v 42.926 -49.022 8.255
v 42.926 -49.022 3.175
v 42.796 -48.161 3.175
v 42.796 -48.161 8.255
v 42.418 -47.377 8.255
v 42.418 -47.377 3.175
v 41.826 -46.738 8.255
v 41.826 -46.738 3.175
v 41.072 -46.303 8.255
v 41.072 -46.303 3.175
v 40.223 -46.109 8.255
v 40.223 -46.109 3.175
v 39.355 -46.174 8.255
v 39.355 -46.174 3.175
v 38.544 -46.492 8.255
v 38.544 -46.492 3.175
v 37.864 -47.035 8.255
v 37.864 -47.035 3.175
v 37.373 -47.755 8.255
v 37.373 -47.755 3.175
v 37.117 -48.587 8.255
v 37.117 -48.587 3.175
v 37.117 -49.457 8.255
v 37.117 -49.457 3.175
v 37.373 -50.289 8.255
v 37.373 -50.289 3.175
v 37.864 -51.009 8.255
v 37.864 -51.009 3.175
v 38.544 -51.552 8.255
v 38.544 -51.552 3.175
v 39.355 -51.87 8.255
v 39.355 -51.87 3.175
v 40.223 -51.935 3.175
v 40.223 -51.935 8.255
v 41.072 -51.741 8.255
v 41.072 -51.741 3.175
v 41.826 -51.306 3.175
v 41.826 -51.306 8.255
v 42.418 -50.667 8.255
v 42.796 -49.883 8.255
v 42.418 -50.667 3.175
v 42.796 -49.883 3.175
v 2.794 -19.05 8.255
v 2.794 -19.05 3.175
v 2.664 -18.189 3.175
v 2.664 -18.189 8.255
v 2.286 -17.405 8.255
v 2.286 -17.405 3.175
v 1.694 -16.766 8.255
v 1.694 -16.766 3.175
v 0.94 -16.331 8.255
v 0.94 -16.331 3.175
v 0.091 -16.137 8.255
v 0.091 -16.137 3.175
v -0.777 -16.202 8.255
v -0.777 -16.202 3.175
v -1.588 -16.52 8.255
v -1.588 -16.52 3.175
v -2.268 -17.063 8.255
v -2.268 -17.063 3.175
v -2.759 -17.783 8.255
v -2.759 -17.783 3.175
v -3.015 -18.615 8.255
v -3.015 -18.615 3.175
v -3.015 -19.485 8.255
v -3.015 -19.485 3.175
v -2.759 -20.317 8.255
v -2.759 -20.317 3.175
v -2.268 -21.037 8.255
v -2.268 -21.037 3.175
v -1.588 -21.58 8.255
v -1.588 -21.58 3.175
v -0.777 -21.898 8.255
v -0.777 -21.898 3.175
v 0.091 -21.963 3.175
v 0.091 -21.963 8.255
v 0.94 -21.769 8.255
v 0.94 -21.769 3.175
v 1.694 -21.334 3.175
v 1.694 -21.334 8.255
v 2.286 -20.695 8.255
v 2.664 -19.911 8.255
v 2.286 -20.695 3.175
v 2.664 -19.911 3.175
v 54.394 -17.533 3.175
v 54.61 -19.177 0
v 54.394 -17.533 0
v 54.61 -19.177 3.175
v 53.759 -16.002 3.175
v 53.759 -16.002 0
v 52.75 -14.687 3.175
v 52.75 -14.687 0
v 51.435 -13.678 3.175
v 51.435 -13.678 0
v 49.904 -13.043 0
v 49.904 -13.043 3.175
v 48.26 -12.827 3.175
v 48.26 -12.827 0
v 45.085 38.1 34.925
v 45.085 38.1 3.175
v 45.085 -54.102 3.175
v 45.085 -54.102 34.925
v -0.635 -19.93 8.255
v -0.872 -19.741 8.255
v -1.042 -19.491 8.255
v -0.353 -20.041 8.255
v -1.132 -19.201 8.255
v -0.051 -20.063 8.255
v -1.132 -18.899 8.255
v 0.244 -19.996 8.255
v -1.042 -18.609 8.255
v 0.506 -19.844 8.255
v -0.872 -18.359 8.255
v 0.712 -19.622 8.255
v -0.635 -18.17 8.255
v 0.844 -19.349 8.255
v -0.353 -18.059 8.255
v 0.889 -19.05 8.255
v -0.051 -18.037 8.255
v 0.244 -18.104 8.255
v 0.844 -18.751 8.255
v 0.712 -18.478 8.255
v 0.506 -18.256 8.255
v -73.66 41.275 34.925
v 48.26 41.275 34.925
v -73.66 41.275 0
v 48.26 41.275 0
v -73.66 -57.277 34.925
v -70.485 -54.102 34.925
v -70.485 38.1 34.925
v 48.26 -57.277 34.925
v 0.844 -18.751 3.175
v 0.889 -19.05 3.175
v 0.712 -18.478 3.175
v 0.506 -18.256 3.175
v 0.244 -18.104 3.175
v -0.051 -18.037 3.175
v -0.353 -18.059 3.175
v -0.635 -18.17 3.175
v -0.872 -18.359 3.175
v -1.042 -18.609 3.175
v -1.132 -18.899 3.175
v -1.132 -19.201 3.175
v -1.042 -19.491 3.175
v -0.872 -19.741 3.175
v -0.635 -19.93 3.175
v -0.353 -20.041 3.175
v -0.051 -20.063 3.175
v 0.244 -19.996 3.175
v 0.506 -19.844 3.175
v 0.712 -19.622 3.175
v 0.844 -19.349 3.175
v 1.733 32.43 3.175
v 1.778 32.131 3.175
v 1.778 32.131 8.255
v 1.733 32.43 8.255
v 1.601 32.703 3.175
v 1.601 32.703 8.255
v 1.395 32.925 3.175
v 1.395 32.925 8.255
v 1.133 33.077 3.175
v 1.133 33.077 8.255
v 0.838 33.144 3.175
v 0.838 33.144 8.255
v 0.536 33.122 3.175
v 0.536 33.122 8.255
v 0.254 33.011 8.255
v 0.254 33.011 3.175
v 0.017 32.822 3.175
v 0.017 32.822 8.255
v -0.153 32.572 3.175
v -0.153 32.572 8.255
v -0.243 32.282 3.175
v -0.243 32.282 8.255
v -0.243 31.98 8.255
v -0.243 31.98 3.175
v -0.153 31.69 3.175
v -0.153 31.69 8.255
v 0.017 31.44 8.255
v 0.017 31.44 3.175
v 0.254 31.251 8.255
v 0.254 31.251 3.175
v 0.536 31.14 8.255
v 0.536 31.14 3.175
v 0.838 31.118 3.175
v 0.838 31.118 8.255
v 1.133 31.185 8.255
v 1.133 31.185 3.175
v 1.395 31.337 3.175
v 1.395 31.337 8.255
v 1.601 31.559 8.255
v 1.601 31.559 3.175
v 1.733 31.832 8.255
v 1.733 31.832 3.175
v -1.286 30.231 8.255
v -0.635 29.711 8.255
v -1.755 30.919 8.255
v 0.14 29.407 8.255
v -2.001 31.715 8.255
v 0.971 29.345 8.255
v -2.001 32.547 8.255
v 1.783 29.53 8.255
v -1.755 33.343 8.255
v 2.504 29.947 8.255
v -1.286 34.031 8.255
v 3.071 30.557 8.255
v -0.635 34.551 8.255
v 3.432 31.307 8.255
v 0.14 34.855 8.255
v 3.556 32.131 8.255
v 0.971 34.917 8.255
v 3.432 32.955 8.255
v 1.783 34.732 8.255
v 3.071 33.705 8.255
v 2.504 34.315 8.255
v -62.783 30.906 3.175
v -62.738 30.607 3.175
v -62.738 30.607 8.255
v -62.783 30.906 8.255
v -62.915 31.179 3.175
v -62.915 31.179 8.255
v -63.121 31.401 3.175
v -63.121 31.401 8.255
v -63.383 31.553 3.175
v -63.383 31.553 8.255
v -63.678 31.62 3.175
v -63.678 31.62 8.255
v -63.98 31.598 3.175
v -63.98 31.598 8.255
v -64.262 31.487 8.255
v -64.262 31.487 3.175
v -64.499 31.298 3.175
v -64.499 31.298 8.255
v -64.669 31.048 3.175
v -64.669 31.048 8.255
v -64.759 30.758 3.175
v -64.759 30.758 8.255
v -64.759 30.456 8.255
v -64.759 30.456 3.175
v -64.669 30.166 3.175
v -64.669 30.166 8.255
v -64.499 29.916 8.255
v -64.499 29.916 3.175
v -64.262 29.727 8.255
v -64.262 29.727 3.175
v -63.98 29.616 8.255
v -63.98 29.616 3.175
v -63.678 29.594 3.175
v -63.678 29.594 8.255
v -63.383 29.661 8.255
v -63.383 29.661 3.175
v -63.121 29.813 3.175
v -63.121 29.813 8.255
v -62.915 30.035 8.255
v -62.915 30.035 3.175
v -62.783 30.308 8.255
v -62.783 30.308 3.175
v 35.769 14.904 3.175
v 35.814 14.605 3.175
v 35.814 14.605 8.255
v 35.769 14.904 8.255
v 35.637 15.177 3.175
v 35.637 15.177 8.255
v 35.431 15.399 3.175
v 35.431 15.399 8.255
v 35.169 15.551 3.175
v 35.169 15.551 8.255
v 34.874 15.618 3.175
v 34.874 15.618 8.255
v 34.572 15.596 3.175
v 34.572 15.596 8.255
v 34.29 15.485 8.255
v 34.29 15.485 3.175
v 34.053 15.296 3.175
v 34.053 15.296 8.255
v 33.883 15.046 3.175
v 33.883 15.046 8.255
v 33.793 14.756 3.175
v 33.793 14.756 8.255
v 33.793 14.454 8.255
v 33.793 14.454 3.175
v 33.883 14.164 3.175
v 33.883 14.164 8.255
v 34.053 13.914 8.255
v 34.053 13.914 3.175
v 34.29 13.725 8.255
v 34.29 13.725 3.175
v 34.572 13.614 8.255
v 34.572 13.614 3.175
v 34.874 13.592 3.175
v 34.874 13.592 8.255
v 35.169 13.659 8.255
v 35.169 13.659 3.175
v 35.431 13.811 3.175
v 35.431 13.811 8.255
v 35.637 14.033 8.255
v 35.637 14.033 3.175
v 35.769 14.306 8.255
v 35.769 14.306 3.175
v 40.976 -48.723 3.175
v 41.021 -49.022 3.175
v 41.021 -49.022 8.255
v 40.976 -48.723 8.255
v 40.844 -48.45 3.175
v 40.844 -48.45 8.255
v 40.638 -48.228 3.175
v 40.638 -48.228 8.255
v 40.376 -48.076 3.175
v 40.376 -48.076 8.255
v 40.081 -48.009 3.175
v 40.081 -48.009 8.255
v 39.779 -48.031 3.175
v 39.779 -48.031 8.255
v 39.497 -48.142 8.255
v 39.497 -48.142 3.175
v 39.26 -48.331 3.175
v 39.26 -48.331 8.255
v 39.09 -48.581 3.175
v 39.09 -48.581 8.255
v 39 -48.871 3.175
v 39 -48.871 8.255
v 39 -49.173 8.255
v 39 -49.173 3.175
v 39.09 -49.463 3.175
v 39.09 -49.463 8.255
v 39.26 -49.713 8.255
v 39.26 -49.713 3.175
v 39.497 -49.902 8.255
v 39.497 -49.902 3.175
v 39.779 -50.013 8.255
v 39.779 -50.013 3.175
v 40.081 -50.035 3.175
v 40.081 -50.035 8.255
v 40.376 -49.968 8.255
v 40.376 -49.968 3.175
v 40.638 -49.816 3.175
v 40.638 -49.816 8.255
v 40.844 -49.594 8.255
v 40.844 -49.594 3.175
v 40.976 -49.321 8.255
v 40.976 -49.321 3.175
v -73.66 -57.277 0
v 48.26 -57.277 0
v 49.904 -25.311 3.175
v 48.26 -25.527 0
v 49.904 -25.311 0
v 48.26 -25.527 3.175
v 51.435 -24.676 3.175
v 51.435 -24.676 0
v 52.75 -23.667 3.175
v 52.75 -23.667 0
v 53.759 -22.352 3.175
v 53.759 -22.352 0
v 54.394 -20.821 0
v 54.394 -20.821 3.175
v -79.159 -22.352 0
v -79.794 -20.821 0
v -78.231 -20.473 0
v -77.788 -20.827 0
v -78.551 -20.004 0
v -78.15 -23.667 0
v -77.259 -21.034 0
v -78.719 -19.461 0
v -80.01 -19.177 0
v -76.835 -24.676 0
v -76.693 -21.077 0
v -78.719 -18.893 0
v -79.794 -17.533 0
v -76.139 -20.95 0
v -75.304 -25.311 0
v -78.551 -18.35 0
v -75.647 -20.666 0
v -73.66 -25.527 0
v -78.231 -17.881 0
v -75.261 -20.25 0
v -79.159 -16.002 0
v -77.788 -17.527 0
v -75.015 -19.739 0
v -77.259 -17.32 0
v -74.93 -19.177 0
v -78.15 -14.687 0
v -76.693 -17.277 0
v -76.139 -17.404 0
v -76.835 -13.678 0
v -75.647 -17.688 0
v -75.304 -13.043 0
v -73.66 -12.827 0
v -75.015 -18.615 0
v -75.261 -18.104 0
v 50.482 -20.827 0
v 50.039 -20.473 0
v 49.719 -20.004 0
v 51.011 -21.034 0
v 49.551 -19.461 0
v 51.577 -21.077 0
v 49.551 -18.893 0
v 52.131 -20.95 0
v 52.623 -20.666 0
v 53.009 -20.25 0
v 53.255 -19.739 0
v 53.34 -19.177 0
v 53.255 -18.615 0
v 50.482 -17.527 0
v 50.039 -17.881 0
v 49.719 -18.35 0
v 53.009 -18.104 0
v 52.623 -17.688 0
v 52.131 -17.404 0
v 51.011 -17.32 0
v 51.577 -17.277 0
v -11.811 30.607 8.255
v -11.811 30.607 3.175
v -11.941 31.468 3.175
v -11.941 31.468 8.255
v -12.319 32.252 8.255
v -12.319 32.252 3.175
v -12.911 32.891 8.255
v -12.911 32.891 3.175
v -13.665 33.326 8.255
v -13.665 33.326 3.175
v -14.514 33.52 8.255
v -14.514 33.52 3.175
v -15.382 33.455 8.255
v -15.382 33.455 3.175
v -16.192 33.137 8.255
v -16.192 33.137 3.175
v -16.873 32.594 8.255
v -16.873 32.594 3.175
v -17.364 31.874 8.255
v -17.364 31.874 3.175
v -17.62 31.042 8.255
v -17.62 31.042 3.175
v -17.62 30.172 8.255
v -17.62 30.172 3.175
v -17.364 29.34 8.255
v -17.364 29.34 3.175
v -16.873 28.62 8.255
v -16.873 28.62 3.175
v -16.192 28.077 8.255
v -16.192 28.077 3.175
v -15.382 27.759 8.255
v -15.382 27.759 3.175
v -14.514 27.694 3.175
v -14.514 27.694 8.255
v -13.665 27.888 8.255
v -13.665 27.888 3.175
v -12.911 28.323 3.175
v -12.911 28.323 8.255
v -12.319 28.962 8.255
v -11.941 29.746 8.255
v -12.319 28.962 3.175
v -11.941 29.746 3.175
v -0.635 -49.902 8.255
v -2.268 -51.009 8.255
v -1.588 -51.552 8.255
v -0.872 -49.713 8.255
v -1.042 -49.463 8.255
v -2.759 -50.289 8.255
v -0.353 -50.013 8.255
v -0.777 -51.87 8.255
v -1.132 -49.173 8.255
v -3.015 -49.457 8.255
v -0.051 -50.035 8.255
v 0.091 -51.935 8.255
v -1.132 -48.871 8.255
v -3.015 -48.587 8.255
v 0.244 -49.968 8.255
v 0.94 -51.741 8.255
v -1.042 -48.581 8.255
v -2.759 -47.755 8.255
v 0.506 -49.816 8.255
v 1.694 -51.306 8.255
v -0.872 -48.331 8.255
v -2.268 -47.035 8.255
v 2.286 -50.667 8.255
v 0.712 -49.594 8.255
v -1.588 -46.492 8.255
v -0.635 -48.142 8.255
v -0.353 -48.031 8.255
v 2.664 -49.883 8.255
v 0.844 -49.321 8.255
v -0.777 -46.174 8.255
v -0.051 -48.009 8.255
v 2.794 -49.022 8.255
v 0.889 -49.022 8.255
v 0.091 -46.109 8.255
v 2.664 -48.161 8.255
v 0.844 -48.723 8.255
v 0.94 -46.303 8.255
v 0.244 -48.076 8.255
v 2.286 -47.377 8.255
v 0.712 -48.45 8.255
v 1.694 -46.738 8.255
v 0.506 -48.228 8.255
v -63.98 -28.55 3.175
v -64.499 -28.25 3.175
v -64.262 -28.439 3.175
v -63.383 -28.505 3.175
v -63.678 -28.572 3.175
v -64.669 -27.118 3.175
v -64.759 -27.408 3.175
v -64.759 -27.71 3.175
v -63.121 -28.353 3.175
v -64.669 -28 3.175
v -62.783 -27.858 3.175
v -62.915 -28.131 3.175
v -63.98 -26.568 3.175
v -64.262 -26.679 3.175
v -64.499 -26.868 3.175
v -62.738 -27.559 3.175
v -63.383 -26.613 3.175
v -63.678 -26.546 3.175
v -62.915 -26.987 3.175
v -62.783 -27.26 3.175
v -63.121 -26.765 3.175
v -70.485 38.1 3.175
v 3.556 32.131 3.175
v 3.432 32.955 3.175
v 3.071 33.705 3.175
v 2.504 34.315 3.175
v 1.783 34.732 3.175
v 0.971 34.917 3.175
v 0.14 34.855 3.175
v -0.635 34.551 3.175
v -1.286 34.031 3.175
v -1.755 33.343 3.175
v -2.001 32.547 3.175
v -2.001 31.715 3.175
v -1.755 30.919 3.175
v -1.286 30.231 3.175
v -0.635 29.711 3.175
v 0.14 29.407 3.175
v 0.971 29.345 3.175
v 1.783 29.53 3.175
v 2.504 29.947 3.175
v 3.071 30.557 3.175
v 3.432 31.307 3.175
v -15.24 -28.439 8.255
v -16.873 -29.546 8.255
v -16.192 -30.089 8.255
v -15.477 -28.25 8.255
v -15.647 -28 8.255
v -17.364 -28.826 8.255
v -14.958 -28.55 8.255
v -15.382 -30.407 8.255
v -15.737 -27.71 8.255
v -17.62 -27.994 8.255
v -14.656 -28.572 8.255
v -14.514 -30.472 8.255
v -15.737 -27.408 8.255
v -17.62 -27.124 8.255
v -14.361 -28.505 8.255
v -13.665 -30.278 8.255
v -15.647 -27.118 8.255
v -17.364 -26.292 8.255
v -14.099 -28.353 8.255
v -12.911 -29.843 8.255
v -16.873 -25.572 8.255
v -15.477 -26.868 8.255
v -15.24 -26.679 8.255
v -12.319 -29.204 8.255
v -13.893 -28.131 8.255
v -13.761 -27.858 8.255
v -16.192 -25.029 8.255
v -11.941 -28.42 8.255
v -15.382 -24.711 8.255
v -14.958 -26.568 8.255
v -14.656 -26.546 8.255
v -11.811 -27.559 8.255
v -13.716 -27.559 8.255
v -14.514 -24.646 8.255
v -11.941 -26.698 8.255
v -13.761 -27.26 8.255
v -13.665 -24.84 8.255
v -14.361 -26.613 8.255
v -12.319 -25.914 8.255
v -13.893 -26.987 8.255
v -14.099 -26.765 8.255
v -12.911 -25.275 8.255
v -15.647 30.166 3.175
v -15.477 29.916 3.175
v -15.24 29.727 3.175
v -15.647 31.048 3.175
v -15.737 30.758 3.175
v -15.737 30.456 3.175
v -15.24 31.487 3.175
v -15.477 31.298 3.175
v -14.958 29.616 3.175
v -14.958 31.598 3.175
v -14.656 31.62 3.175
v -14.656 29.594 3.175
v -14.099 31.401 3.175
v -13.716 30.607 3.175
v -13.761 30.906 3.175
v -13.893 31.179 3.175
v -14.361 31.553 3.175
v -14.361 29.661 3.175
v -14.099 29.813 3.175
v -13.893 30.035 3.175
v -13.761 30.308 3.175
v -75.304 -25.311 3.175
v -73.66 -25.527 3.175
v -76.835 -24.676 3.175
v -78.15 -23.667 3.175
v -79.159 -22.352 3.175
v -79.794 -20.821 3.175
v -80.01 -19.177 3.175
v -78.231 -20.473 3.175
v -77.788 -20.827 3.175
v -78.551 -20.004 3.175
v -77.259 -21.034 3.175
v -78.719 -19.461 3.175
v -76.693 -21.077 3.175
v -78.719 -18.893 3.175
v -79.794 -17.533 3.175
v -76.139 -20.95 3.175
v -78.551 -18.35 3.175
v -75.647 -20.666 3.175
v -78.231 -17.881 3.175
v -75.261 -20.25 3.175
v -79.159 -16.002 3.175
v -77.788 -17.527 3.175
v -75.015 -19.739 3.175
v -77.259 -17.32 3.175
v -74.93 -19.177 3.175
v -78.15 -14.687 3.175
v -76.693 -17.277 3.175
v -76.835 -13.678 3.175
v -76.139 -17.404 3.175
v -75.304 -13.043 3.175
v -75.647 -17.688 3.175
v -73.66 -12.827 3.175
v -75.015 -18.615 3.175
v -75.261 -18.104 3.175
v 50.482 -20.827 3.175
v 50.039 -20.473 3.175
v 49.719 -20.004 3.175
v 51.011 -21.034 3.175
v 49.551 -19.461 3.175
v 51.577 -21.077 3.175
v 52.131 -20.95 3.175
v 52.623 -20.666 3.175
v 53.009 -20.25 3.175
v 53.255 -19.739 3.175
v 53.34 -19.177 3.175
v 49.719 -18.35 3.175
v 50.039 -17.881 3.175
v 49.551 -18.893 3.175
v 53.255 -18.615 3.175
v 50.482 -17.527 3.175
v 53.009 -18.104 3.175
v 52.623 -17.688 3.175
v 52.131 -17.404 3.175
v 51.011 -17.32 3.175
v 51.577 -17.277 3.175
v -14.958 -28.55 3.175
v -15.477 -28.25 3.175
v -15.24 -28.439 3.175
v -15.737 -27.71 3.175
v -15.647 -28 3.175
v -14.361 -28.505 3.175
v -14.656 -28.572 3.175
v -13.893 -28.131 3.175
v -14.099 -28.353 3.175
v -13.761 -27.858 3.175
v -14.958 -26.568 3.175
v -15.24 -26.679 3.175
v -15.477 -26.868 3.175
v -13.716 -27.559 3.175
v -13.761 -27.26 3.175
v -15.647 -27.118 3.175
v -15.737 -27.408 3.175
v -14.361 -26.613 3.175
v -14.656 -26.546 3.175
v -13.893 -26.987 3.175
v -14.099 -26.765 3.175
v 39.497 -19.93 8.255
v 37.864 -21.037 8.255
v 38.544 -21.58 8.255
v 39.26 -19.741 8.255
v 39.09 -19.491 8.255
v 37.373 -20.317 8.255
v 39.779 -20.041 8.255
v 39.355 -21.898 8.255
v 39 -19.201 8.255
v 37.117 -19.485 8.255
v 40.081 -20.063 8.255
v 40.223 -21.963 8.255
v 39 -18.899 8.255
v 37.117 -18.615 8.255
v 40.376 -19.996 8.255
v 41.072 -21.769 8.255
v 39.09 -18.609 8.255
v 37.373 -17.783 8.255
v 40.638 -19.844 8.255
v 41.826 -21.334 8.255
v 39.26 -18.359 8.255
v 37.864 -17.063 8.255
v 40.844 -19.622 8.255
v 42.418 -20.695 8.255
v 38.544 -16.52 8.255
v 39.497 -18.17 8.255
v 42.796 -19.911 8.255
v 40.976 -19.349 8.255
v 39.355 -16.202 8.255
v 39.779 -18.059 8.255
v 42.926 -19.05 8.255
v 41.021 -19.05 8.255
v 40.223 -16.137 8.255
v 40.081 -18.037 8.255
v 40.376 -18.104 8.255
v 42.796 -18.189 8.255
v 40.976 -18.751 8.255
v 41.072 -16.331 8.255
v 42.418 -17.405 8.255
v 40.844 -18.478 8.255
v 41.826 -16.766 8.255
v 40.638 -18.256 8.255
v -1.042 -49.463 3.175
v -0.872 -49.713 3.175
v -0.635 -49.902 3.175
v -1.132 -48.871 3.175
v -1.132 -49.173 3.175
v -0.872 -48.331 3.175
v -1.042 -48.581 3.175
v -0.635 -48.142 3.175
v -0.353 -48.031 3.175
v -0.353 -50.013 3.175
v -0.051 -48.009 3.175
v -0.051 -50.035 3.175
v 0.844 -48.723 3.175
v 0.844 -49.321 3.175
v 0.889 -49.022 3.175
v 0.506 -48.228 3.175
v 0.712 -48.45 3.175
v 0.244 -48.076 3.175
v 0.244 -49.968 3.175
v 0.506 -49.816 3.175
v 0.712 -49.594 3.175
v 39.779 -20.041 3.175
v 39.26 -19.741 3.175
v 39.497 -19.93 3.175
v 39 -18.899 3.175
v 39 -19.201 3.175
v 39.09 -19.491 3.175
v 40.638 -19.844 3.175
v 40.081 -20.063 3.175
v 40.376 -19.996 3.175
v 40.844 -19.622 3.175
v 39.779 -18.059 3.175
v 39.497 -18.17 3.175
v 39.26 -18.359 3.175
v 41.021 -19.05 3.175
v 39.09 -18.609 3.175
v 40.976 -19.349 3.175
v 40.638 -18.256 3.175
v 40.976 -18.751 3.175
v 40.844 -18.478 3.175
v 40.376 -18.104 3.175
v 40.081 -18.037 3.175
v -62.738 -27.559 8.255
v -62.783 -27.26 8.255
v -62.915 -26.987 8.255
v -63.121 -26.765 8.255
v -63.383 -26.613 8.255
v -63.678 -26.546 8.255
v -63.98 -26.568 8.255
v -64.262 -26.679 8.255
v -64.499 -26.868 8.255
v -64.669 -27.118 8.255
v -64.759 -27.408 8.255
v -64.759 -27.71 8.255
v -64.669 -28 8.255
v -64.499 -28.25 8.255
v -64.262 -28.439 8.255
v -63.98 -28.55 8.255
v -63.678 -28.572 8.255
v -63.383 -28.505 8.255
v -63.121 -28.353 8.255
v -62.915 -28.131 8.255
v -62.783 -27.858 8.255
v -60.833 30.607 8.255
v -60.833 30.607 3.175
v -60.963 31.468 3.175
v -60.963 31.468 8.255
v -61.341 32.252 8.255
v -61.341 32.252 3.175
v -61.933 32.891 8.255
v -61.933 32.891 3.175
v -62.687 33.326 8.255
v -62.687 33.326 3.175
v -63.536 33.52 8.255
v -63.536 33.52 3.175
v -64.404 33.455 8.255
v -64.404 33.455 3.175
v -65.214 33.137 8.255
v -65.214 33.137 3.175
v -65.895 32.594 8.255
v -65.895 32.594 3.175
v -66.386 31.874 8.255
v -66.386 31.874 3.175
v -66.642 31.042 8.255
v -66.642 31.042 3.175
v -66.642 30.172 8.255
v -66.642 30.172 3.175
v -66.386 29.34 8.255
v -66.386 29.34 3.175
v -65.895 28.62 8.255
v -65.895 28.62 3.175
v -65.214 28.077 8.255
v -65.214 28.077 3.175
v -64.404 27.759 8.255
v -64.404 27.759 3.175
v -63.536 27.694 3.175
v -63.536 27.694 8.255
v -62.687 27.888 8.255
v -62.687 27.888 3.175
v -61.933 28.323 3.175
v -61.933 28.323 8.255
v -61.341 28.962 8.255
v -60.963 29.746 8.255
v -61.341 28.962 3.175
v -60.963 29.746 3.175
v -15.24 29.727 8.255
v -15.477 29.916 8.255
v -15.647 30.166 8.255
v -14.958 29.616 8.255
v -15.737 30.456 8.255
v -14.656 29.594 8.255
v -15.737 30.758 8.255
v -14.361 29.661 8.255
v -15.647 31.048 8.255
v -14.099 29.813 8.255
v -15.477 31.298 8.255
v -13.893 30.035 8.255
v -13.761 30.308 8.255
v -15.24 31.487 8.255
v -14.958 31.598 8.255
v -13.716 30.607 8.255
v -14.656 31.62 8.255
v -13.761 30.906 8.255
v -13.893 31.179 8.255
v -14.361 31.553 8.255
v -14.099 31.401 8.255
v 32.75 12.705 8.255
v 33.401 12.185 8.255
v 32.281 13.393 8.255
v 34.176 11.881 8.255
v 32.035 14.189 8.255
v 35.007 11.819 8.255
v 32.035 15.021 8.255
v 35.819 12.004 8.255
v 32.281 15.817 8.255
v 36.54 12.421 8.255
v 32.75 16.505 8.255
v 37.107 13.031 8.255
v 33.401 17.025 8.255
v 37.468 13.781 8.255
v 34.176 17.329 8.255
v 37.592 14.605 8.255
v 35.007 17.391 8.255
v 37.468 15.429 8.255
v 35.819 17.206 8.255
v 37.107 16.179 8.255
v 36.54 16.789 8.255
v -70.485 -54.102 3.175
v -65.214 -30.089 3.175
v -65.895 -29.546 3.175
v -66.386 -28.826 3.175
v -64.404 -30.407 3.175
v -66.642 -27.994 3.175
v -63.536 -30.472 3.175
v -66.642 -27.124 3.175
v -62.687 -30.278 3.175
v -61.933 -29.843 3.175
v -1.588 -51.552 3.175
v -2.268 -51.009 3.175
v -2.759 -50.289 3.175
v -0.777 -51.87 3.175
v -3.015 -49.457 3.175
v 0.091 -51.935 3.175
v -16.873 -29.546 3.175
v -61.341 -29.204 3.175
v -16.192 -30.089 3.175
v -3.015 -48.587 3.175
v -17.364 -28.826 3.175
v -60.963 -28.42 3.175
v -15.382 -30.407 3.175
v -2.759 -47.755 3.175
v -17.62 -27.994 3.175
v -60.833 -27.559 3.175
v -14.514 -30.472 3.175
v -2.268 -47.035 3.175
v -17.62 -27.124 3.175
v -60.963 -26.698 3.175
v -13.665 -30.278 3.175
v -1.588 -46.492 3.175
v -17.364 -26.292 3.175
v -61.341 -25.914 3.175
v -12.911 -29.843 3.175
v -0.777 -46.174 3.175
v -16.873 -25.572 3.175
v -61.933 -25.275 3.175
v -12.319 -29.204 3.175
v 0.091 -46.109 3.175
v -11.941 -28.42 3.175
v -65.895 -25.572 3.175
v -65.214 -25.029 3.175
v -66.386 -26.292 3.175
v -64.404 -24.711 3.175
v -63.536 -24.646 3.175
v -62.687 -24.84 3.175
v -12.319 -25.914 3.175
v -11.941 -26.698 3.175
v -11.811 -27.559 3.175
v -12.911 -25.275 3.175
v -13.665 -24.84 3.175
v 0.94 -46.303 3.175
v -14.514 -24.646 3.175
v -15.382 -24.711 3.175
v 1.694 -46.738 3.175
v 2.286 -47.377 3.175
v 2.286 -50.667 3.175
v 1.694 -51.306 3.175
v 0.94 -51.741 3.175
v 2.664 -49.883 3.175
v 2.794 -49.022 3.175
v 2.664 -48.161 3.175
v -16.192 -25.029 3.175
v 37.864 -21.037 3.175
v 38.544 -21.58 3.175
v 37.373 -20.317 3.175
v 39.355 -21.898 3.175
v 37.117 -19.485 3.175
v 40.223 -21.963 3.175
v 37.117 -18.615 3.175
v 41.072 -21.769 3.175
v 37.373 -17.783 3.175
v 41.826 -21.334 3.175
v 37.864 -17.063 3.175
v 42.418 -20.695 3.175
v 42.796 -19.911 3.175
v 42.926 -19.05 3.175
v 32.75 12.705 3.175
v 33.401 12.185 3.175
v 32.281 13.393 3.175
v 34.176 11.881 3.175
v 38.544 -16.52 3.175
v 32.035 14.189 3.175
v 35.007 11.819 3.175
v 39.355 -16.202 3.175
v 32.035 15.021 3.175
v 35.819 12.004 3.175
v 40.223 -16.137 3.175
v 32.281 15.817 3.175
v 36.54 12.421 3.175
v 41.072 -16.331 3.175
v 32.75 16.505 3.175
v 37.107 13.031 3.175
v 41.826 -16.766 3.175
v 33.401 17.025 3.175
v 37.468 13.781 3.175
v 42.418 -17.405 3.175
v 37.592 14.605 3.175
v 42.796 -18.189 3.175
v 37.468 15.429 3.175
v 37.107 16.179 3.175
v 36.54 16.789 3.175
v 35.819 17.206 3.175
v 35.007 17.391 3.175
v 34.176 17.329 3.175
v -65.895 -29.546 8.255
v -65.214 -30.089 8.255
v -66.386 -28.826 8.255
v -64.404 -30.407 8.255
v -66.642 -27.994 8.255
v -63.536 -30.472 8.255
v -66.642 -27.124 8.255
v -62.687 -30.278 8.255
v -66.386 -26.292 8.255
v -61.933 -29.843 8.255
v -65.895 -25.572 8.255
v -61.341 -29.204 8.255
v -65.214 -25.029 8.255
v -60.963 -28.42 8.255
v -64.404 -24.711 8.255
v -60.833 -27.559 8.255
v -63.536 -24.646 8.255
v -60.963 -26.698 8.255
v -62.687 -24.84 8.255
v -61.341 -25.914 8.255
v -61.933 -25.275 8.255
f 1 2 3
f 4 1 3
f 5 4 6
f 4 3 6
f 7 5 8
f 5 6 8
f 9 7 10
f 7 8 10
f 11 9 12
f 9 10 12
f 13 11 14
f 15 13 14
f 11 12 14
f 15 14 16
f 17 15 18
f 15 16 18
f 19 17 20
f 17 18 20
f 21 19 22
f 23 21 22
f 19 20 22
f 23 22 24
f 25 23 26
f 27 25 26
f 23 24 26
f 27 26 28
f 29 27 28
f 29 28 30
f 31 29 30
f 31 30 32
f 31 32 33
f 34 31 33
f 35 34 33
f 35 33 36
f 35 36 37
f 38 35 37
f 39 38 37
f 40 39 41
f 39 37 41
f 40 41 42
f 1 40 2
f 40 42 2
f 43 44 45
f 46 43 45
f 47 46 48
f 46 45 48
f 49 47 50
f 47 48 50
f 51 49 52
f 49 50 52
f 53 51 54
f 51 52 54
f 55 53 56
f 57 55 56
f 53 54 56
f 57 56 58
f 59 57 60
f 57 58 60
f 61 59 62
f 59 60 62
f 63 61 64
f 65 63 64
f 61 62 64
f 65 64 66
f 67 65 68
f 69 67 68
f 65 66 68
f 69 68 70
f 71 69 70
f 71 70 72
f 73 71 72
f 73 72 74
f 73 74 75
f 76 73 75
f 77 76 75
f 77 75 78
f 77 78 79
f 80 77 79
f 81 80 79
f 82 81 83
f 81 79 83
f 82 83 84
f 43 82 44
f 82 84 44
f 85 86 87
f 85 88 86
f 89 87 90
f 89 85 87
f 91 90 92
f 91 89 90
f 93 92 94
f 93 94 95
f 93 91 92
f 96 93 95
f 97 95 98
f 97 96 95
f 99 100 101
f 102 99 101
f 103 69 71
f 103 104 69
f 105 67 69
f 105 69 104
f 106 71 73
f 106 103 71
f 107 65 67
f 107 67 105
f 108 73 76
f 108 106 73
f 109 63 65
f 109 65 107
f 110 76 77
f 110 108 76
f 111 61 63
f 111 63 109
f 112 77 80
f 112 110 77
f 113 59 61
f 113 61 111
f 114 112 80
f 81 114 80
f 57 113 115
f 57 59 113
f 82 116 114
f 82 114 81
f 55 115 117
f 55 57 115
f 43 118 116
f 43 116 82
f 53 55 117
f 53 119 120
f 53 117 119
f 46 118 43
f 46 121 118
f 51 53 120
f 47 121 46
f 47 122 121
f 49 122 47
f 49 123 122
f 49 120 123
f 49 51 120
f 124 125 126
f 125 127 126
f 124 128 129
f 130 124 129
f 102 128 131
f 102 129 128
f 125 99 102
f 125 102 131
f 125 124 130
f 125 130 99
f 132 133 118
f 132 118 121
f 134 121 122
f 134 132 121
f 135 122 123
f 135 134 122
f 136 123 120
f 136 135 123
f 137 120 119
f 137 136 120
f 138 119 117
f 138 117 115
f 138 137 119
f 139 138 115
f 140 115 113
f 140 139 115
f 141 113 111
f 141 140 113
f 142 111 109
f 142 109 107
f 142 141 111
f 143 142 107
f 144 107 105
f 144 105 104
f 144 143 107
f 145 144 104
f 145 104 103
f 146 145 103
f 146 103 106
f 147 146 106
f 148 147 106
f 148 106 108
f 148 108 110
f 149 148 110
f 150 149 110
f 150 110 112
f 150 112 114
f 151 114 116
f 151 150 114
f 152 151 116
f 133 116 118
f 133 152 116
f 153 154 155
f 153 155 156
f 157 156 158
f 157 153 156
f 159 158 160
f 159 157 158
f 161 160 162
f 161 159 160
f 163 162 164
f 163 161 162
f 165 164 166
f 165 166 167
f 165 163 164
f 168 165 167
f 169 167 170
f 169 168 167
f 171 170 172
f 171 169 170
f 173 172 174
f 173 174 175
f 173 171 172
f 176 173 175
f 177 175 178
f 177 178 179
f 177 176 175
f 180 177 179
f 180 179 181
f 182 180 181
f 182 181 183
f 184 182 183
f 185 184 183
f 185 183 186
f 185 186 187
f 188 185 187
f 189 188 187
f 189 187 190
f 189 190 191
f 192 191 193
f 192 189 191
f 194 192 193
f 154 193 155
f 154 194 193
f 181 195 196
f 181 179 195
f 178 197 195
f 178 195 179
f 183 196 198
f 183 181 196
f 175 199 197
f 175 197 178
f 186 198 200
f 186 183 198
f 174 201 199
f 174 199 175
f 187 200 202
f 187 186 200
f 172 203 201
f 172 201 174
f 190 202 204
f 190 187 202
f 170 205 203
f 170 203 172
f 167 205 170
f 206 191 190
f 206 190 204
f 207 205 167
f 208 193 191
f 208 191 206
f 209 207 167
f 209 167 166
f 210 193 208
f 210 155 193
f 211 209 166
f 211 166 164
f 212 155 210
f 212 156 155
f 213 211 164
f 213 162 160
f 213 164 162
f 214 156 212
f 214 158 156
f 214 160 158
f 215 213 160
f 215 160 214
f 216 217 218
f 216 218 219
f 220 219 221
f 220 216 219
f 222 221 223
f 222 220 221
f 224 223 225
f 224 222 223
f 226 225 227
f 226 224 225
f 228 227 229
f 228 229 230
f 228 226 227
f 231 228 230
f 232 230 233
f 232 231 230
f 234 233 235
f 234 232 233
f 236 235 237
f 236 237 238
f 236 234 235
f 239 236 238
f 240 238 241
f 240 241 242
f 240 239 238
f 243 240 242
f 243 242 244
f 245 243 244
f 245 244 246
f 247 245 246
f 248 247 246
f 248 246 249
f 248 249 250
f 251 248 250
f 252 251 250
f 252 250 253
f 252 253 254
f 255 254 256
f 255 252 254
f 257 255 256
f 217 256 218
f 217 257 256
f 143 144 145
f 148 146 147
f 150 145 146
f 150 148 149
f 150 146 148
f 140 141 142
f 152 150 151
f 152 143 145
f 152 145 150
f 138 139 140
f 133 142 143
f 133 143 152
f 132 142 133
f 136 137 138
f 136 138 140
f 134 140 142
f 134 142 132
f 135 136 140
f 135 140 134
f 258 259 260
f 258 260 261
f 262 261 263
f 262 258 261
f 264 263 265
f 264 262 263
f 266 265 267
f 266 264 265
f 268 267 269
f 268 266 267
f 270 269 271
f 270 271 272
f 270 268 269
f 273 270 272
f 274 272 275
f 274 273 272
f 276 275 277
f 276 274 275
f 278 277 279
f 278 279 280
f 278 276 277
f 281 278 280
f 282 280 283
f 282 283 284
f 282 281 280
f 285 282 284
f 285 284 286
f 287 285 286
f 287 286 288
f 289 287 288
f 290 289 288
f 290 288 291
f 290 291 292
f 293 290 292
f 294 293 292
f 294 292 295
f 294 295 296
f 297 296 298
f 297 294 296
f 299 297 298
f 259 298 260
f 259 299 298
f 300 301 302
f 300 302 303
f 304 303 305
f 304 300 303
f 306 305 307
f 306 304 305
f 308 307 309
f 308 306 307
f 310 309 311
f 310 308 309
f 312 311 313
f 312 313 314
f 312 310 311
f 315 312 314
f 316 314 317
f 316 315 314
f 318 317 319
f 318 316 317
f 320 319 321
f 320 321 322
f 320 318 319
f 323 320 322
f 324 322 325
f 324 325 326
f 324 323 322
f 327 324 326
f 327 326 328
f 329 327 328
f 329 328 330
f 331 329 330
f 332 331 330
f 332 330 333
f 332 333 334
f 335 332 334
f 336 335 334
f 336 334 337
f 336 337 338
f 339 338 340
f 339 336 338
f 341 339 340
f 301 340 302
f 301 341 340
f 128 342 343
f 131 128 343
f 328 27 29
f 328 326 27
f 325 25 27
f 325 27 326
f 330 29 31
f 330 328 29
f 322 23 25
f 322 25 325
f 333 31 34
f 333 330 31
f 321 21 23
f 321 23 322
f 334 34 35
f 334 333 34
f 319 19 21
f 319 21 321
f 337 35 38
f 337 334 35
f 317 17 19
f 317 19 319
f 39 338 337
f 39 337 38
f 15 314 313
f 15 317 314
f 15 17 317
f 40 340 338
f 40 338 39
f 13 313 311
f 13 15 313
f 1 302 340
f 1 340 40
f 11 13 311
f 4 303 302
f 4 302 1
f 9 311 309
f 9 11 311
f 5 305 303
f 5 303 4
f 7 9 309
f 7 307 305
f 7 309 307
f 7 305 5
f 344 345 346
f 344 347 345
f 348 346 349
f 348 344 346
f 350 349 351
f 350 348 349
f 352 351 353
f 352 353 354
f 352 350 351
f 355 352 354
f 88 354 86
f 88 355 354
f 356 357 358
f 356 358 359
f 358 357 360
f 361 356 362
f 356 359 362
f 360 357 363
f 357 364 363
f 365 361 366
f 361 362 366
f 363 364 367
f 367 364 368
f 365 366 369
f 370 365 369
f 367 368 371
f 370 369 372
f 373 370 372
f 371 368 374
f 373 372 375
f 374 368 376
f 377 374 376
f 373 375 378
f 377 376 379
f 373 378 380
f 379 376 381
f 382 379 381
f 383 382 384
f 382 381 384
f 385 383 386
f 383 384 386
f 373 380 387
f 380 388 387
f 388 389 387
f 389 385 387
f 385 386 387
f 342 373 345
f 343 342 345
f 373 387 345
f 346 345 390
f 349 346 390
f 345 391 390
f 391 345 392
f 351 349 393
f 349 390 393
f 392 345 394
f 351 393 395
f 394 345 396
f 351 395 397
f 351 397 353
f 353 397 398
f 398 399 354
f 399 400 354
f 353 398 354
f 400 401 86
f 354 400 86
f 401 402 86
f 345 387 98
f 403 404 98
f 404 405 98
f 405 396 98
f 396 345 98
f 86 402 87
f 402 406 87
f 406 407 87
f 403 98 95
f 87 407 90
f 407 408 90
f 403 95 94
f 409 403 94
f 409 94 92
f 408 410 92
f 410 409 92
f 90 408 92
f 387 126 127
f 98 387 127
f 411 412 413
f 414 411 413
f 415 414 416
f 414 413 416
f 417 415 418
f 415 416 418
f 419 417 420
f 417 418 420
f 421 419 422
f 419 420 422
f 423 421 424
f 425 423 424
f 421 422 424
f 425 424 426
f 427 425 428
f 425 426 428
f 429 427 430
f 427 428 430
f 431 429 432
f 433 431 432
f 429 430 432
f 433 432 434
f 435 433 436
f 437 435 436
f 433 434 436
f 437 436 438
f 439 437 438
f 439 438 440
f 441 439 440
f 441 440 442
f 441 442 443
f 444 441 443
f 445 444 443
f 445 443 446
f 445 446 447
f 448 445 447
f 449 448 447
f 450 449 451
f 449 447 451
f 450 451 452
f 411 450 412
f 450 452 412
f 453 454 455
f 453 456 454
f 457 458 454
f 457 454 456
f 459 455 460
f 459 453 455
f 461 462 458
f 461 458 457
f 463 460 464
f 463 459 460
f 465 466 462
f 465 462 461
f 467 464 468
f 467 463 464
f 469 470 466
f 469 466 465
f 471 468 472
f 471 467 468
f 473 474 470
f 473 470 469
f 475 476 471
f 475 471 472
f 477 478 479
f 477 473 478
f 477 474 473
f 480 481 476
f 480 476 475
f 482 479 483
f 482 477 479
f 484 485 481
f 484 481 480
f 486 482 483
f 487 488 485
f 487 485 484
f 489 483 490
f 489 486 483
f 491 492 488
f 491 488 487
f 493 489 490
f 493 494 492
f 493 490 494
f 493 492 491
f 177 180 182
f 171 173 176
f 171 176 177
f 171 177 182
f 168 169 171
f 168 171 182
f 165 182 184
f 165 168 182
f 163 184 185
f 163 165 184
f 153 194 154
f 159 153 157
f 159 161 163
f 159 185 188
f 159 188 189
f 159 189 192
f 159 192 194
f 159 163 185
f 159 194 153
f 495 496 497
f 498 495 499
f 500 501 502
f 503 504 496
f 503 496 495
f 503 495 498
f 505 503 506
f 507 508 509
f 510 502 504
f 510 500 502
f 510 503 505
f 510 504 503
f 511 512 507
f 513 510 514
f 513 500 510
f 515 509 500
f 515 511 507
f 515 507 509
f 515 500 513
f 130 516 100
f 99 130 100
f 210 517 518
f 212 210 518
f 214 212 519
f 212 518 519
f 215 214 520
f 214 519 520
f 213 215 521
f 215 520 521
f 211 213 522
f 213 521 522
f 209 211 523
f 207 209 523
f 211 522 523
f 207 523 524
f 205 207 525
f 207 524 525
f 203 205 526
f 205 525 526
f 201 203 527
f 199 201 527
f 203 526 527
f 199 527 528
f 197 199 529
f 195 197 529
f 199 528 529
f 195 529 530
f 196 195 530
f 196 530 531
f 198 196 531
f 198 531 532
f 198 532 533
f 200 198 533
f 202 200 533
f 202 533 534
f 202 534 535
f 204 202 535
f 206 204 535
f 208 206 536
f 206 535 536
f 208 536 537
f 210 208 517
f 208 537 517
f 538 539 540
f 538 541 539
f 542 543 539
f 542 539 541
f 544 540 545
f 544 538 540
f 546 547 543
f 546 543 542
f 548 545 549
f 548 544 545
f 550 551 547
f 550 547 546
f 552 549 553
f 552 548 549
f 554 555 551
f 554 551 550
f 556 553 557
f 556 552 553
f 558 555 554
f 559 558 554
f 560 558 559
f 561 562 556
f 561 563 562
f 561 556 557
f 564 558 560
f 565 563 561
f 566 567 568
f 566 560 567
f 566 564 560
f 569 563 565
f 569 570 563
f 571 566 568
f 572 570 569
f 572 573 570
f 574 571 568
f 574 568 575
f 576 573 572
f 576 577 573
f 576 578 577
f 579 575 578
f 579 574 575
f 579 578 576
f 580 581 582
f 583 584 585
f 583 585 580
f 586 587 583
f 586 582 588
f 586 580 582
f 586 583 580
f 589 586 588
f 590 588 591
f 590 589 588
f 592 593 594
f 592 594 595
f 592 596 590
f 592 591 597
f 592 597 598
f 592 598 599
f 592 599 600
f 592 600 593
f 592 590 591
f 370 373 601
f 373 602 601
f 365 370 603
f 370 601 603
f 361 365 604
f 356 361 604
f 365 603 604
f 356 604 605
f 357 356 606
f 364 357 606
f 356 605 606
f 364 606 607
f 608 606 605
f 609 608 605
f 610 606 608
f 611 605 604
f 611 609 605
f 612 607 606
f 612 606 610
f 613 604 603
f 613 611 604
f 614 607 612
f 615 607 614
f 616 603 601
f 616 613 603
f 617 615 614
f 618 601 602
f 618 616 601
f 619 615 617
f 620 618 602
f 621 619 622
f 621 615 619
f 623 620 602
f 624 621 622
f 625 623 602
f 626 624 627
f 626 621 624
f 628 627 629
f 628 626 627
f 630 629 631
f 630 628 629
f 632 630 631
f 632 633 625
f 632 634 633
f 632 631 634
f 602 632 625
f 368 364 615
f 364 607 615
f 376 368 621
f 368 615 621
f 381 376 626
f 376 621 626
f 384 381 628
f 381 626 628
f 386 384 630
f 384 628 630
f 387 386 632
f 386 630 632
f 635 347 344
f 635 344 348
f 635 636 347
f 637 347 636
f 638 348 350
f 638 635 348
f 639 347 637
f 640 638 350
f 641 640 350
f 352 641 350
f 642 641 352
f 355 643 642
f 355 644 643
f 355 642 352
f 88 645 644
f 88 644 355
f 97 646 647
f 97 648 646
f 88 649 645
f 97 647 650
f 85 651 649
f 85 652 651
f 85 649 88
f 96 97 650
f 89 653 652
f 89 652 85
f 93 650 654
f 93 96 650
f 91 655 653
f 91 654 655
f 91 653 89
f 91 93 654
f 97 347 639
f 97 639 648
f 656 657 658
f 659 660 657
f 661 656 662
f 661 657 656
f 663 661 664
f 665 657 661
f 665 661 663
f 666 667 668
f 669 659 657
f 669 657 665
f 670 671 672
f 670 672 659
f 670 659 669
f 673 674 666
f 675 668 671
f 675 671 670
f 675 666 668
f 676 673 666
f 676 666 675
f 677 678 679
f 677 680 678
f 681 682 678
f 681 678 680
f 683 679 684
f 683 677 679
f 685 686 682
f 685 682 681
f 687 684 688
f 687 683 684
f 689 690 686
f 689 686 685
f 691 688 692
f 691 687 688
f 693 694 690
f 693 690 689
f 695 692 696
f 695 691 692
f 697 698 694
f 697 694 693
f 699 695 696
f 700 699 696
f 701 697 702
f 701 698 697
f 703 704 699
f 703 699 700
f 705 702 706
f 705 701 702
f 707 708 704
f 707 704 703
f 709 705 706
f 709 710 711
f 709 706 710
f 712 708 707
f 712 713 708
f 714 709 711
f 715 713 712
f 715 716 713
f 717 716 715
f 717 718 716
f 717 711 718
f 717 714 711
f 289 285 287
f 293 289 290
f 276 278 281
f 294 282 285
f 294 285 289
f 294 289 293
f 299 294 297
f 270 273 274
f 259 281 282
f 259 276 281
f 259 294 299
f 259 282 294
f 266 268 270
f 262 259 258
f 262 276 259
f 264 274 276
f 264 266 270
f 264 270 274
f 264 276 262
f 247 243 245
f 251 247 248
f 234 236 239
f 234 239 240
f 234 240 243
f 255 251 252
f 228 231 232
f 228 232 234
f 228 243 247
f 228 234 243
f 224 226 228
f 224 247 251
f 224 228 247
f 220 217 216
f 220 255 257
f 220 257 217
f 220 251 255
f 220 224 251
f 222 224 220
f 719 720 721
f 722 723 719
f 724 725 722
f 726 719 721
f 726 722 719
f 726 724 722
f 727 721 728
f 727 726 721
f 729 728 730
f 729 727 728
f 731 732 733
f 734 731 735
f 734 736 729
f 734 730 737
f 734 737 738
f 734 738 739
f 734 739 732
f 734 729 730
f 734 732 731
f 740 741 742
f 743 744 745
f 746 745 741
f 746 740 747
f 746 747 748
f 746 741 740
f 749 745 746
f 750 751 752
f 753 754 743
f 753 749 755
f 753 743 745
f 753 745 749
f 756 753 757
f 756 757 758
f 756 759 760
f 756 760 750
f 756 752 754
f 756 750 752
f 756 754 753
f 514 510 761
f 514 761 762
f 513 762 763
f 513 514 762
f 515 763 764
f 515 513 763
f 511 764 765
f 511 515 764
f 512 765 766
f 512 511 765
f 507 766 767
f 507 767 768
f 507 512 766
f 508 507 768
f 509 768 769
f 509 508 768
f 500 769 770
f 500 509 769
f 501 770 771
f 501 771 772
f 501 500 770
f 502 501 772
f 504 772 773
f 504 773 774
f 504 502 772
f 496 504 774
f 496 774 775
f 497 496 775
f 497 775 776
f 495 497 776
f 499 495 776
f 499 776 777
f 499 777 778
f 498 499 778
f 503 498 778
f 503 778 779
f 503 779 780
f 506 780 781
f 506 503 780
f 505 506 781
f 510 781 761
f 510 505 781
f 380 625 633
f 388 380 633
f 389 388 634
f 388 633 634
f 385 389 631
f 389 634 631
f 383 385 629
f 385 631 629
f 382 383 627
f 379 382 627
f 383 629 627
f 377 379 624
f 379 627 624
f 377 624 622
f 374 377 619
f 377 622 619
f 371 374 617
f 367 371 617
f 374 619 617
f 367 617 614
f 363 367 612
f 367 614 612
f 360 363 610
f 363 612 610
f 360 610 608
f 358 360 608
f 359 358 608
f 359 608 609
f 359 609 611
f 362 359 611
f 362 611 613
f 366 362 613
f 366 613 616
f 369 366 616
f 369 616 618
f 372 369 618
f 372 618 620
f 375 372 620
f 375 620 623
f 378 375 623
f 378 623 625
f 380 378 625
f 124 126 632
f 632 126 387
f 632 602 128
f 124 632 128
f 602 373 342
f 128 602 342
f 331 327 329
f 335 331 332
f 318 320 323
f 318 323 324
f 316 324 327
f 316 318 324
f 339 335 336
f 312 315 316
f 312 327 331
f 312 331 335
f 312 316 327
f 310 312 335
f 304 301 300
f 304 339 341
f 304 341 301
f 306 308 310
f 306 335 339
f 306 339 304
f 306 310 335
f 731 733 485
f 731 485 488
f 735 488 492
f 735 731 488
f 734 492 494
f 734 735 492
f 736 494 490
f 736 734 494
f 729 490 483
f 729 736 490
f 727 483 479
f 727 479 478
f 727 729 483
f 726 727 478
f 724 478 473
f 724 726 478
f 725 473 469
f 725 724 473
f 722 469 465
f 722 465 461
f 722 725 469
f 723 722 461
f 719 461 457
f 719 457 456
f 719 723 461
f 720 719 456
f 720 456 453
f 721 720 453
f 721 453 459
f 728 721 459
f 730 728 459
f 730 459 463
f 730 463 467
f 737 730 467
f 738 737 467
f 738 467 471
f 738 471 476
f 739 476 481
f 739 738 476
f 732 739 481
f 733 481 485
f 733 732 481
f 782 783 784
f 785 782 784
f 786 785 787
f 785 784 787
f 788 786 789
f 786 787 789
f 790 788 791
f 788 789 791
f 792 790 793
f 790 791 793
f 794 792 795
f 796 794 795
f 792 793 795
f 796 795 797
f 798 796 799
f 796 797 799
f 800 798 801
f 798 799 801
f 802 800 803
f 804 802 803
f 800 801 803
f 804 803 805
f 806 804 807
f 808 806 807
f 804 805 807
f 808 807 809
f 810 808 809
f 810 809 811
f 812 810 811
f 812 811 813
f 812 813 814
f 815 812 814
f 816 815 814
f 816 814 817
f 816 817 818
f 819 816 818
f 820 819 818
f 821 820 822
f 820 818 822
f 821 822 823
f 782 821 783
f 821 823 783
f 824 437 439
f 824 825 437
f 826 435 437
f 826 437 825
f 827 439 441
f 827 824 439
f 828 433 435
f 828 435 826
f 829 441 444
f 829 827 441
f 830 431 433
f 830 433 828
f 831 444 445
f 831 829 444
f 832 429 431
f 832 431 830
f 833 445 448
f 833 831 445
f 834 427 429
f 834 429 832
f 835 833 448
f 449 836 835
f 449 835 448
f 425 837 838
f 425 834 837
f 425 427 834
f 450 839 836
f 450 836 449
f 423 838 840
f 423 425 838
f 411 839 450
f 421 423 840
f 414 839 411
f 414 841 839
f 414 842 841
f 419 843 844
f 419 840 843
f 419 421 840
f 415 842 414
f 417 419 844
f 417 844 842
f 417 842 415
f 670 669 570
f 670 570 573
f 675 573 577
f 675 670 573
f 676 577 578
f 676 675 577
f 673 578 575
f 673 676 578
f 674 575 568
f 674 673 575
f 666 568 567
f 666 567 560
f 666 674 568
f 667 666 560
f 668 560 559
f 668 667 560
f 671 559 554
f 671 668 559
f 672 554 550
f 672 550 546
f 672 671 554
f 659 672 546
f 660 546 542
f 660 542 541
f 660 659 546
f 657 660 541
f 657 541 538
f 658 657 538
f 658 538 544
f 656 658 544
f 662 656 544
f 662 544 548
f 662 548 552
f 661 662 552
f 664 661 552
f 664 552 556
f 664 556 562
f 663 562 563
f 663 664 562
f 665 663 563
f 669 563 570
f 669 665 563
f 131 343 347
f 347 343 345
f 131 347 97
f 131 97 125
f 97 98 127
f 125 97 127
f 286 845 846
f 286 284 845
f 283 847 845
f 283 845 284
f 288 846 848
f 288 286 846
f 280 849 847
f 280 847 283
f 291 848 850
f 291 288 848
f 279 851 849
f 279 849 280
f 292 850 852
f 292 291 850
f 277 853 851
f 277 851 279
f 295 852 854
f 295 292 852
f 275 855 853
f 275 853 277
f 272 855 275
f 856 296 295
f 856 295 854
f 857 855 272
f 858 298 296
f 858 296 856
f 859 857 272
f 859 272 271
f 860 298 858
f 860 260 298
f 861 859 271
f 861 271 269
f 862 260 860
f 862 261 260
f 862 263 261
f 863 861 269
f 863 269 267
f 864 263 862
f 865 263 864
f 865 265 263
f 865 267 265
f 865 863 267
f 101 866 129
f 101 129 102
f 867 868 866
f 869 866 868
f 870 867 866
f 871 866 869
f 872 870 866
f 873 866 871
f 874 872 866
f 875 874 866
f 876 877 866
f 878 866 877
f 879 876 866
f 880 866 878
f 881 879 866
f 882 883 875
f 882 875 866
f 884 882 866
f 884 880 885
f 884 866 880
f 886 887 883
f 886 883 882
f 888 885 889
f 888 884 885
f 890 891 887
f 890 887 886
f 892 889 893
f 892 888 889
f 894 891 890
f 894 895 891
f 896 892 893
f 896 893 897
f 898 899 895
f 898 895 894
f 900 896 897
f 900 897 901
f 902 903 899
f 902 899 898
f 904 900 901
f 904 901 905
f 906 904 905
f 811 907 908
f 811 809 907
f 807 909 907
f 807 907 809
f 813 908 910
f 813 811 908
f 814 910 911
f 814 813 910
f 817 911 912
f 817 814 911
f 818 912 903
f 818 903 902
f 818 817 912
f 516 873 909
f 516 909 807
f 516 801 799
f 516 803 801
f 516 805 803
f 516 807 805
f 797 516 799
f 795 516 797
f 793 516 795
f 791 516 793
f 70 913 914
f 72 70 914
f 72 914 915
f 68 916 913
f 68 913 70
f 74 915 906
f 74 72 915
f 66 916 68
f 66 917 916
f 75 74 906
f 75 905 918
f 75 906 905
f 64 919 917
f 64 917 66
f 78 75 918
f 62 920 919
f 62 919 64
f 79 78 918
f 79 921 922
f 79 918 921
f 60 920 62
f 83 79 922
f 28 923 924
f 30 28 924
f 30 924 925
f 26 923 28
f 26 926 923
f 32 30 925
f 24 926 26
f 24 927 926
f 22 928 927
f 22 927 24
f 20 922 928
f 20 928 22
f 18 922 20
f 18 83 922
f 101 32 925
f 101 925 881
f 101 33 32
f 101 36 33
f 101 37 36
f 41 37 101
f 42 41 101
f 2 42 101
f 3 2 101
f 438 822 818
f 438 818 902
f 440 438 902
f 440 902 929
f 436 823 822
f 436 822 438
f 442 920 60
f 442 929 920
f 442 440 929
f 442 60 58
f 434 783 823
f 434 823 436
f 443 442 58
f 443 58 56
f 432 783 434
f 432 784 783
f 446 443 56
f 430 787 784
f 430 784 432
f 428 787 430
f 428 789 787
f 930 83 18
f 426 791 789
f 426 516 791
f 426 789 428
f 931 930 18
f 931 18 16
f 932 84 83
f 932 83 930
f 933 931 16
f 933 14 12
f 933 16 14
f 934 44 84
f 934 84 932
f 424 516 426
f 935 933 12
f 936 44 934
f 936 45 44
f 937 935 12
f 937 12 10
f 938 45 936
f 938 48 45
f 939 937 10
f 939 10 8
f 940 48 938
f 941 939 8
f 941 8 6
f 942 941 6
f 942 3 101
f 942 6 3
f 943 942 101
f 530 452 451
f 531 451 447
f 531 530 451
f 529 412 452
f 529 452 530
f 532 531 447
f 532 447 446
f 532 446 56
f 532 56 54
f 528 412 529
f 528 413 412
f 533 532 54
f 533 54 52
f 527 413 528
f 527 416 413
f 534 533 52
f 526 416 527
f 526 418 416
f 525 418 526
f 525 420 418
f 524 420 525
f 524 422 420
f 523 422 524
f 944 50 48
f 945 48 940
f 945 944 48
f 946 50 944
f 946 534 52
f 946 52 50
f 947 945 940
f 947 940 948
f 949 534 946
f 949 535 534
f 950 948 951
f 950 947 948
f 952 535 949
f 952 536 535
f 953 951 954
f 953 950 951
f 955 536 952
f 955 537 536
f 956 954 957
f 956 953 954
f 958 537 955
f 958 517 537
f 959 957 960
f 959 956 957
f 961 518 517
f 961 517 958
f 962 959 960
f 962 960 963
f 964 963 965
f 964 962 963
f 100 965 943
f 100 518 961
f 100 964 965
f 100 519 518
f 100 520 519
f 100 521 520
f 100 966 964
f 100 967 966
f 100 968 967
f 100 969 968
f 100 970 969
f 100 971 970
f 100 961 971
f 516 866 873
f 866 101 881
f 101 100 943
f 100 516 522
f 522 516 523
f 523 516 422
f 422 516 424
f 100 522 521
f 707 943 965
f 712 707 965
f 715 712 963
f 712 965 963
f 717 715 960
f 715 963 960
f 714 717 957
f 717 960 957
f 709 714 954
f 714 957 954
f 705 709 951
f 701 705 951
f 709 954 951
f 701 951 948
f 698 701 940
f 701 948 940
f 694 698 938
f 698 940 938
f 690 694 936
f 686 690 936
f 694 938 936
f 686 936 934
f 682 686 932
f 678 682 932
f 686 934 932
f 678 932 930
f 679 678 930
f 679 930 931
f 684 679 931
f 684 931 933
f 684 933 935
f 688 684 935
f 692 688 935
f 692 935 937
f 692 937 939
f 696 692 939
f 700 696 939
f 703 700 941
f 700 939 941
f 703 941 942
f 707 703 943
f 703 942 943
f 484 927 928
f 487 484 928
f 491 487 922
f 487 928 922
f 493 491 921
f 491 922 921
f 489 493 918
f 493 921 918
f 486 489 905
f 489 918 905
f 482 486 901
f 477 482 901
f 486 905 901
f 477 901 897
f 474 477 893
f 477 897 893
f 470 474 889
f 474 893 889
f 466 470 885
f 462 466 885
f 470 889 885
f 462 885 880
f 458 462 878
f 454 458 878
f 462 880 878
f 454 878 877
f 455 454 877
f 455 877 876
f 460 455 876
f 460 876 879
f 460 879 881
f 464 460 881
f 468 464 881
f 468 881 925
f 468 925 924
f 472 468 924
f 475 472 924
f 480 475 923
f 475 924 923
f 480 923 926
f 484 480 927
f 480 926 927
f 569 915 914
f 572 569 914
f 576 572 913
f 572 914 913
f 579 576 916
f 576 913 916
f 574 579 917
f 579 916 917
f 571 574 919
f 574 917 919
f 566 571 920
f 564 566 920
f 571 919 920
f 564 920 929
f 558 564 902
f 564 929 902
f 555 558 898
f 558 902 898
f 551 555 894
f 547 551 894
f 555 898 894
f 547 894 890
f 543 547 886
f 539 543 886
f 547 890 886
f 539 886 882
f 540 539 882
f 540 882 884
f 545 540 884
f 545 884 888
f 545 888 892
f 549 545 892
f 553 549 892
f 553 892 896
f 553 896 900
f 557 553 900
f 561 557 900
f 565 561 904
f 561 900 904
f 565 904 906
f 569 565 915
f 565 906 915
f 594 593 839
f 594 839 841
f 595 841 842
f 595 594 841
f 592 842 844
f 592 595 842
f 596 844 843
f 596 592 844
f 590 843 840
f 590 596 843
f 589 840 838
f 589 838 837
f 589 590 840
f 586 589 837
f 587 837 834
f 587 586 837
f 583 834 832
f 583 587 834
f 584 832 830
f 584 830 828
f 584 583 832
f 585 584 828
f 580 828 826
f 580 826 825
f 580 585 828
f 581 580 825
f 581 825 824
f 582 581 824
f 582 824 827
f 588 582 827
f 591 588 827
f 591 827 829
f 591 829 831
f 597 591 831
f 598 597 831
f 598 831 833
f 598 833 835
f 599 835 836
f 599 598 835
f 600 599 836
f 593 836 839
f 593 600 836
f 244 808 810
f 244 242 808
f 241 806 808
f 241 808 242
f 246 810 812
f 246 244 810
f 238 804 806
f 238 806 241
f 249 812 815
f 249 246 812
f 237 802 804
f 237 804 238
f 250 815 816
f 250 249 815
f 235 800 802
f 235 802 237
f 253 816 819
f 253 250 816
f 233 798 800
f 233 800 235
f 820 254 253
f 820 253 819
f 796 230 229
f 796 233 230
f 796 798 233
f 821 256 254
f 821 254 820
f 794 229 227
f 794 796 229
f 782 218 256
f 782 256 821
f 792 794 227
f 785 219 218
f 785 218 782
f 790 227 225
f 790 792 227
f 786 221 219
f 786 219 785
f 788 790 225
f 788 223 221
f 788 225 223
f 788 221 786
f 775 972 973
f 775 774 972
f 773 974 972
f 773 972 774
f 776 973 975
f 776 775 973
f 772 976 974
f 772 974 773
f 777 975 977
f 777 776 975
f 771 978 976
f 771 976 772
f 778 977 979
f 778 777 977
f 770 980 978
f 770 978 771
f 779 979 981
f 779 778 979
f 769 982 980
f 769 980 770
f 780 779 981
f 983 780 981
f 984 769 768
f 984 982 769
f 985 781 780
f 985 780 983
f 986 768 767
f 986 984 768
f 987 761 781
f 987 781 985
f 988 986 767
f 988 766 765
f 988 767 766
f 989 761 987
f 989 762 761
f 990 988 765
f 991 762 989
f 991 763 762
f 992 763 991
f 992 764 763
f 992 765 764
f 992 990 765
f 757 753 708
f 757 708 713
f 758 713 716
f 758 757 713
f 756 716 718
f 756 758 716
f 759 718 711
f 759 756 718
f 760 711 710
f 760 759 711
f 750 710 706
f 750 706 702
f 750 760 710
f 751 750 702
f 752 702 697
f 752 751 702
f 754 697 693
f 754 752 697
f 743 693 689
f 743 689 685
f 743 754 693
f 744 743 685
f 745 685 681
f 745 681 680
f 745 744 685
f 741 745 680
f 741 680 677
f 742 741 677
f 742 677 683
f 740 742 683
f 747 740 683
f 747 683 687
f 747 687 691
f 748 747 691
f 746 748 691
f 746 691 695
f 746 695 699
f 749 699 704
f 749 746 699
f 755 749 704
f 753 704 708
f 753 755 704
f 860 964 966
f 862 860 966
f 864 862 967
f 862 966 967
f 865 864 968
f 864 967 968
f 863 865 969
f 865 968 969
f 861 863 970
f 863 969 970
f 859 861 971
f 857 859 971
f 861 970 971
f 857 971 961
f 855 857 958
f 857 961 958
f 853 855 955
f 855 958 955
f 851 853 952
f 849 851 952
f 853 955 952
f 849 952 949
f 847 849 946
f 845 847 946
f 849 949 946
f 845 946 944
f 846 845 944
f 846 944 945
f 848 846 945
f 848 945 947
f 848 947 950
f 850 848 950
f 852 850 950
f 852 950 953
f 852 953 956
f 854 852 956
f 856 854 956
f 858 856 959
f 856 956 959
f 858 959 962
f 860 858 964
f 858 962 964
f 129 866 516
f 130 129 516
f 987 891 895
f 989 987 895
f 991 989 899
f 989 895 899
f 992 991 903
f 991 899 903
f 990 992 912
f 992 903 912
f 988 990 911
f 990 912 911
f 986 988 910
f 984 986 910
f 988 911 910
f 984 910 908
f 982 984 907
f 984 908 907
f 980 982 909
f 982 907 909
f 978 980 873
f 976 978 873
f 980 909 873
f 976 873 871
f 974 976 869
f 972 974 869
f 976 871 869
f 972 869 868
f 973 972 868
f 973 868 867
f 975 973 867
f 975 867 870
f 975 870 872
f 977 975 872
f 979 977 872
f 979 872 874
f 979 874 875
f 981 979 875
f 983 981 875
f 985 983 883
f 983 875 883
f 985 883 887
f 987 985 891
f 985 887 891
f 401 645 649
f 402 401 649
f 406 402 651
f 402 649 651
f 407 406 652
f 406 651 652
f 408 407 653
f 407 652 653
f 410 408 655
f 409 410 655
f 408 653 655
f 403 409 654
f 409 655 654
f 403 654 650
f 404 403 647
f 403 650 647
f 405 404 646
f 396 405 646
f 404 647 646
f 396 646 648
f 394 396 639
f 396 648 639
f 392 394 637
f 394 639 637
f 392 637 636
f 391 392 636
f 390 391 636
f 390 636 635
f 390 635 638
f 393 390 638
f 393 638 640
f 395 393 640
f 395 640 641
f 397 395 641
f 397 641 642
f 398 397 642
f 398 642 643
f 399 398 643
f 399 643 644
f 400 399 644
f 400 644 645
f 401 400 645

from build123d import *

# Parameters (mm, degrees)
F0_W      = 121.92
F0_H      = 98.552
F1_DEPTH  = 3.175
F2_W      = 12.7
F2_H      = 3.175
F3_DEPTH  = 6.35
F4_W      = 12.7
F4_H      = 3.175
F5_DEPTH  = 6.35
F6_R      = 6.34999
F7_R      = 1.905
F8_DEPTH  = 6.35
F9_W      = 115.57
F9_H      = 3.175
F10_DEPTH = 31.75
F11_R     = 2.921
F11_R_2   = 1.016
F12_R     = 2.794
F12_R_2   = 1.016
F13_R     = 2.921
F13_R_2   = 1.016
F14_DEPTH = 5.08


# Not quite as in the source:
# - a fillet or chamfer is up to 0.001 mm smaller than in the source, because OpenCascade refuses the exact size
# - a feature names something its author has since deleted; it is built from what else it names


with BuildPart() as f1:
    # F0 (on Top) → F1 (new body)
    with BuildSketch(Plane.XY):
        with Locations((-12.7, -8.001)):
            Rectangle(F0_W, F0_H)
    extrude(amount=F1_DEPTH)

    # F2 (on face) → F3 (join)
    with BuildSketch(Plane.YZ.offset(48.26)):
        with Locations((-19.177, 1.5875)):
            Rectangle(F2_W, F2_H)
    extrude(amount=F3_DEPTH)

    # F4 (on face) → F5 (join)
    with BuildSketch(Plane(origin=(-73.66, 0, 0), x_dir=(0, -1, 0), z_dir=(-1, 0, 0))):
        with Locations((19.177, 1.5875)):
            Rectangle(F4_W, F4_H)
    extrude(amount=F5_DEPTH)

    # F6 (radius 6.35 in the source; OpenCascade refuses exactly that, so slightly less here)
    f6_edges = [f1.edges().sort_by_distance(p)[0] for p in [
        (-80.01, -25.527, 1.5875),
        (-80.01, -12.827, 1.5875),
        (54.61, -25.527, 1.5875),
        (54.61, -12.827, 1.5875),
    ]]
    fillet(f6_edges, radius=F6_R)

    # F7 (on face) → F8 (cut)
    with BuildSketch(Plane.XY.offset(3.175)):
        with Locations((-76.835, -19.177)):
            Circle(F7_R)
        with Locations((51.435, -19.177)):
            Circle(F7_R)
    extrude(amount=-F8_DEPTH, mode=Mode.SUBTRACT)

    # F9 (on face) → F10 (join)
    with BuildSketch(Plane.XY.offset(3.175)):
        Polygon((-73.66, -57.277), (-70.485, -57.277), (-70.485, -54.102), (-70.485, 38.1), (-70.485, 41.275), (-73.66, 41.275), (-73.66, -12.827), (-73.66, -25.527), align=None)
        with Locations((-12.7, -55.6895)):
            Rectangle(F9_W, F9_H)
        with Locations((-12.7, 39.6875)):
            Rectangle(F9_W, F9_H)
        Polygon((45.085, -57.277), (48.26, -57.277), (48.26, -25.527), (48.26, -12.827), (48.26, 41.275), (45.085, 41.275), (45.085, 38.1), (45.085, -54.102), align=None)
    extrude(amount=F10_DEPTH)

    # F11 (on face) + F12 (on face) + F13 (on face) → F14 (join)
    with BuildSketch(Plane.XY.offset(3.175)):
        with Locations((-63.754, 30.607)):
            Circle(F11_R)
        with Locations((-63.754, 30.607)):
            Circle(F11_R_2, mode=Mode.SUBTRACT)
        with Locations((-14.732, -27.559)):
            Circle(F11_R)
        with Locations((-14.732, -27.559)):
            Circle(F11_R_2, mode=Mode.SUBTRACT)
        with Locations((-14.732, 30.607)):
            Circle(F11_R)
        with Locations((-14.732, 30.607)):
            Circle(F11_R_2, mode=Mode.SUBTRACT)
        with Locations((-63.754, -27.559)):
            Circle(F11_R)
        with Locations((-63.754, -27.559)):
            Circle(F11_R_2, mode=Mode.SUBTRACT)
    with BuildSketch(Plane.XY.offset(3.175)):
        with Locations((34.798, 14.605)):
            Circle(F12_R)
        with Locations((34.798, 14.605)):
            Circle(F12_R_2, mode=Mode.SUBTRACT)
        with Locations((0.762, 32.131)):
            Circle(F12_R)
        with Locations((0.762, 32.131)):
            Circle(F12_R_2, mode=Mode.SUBTRACT)
    with BuildSketch(Plane.XY.offset(3.175)):
        with Locations((40.005, -19.05)):
            Circle(F13_R)
        with Locations((40.005, -19.05)):
            Circle(F13_R_2, mode=Mode.SUBTRACT)
        with Locations((40.005, -49.022)):
            Circle(F13_R)
        with Locations((40.005, -49.022)):
            Circle(F13_R_2, mode=Mode.SUBTRACT)
        with Locations((-0.127, -49.022)):
            Circle(F13_R)
        with Locations((-0.127, -49.022)):
            Circle(F13_R_2, mode=Mode.SUBTRACT)
        with Locations((-0.127, -19.05)):
            Circle(F13_R)
        with Locations((-0.127, -19.05)):
            Circle(F13_R_2, mode=Mode.SUBTRACT)
    extrude(amount=F14_DEPTH)


solid = f1.part
